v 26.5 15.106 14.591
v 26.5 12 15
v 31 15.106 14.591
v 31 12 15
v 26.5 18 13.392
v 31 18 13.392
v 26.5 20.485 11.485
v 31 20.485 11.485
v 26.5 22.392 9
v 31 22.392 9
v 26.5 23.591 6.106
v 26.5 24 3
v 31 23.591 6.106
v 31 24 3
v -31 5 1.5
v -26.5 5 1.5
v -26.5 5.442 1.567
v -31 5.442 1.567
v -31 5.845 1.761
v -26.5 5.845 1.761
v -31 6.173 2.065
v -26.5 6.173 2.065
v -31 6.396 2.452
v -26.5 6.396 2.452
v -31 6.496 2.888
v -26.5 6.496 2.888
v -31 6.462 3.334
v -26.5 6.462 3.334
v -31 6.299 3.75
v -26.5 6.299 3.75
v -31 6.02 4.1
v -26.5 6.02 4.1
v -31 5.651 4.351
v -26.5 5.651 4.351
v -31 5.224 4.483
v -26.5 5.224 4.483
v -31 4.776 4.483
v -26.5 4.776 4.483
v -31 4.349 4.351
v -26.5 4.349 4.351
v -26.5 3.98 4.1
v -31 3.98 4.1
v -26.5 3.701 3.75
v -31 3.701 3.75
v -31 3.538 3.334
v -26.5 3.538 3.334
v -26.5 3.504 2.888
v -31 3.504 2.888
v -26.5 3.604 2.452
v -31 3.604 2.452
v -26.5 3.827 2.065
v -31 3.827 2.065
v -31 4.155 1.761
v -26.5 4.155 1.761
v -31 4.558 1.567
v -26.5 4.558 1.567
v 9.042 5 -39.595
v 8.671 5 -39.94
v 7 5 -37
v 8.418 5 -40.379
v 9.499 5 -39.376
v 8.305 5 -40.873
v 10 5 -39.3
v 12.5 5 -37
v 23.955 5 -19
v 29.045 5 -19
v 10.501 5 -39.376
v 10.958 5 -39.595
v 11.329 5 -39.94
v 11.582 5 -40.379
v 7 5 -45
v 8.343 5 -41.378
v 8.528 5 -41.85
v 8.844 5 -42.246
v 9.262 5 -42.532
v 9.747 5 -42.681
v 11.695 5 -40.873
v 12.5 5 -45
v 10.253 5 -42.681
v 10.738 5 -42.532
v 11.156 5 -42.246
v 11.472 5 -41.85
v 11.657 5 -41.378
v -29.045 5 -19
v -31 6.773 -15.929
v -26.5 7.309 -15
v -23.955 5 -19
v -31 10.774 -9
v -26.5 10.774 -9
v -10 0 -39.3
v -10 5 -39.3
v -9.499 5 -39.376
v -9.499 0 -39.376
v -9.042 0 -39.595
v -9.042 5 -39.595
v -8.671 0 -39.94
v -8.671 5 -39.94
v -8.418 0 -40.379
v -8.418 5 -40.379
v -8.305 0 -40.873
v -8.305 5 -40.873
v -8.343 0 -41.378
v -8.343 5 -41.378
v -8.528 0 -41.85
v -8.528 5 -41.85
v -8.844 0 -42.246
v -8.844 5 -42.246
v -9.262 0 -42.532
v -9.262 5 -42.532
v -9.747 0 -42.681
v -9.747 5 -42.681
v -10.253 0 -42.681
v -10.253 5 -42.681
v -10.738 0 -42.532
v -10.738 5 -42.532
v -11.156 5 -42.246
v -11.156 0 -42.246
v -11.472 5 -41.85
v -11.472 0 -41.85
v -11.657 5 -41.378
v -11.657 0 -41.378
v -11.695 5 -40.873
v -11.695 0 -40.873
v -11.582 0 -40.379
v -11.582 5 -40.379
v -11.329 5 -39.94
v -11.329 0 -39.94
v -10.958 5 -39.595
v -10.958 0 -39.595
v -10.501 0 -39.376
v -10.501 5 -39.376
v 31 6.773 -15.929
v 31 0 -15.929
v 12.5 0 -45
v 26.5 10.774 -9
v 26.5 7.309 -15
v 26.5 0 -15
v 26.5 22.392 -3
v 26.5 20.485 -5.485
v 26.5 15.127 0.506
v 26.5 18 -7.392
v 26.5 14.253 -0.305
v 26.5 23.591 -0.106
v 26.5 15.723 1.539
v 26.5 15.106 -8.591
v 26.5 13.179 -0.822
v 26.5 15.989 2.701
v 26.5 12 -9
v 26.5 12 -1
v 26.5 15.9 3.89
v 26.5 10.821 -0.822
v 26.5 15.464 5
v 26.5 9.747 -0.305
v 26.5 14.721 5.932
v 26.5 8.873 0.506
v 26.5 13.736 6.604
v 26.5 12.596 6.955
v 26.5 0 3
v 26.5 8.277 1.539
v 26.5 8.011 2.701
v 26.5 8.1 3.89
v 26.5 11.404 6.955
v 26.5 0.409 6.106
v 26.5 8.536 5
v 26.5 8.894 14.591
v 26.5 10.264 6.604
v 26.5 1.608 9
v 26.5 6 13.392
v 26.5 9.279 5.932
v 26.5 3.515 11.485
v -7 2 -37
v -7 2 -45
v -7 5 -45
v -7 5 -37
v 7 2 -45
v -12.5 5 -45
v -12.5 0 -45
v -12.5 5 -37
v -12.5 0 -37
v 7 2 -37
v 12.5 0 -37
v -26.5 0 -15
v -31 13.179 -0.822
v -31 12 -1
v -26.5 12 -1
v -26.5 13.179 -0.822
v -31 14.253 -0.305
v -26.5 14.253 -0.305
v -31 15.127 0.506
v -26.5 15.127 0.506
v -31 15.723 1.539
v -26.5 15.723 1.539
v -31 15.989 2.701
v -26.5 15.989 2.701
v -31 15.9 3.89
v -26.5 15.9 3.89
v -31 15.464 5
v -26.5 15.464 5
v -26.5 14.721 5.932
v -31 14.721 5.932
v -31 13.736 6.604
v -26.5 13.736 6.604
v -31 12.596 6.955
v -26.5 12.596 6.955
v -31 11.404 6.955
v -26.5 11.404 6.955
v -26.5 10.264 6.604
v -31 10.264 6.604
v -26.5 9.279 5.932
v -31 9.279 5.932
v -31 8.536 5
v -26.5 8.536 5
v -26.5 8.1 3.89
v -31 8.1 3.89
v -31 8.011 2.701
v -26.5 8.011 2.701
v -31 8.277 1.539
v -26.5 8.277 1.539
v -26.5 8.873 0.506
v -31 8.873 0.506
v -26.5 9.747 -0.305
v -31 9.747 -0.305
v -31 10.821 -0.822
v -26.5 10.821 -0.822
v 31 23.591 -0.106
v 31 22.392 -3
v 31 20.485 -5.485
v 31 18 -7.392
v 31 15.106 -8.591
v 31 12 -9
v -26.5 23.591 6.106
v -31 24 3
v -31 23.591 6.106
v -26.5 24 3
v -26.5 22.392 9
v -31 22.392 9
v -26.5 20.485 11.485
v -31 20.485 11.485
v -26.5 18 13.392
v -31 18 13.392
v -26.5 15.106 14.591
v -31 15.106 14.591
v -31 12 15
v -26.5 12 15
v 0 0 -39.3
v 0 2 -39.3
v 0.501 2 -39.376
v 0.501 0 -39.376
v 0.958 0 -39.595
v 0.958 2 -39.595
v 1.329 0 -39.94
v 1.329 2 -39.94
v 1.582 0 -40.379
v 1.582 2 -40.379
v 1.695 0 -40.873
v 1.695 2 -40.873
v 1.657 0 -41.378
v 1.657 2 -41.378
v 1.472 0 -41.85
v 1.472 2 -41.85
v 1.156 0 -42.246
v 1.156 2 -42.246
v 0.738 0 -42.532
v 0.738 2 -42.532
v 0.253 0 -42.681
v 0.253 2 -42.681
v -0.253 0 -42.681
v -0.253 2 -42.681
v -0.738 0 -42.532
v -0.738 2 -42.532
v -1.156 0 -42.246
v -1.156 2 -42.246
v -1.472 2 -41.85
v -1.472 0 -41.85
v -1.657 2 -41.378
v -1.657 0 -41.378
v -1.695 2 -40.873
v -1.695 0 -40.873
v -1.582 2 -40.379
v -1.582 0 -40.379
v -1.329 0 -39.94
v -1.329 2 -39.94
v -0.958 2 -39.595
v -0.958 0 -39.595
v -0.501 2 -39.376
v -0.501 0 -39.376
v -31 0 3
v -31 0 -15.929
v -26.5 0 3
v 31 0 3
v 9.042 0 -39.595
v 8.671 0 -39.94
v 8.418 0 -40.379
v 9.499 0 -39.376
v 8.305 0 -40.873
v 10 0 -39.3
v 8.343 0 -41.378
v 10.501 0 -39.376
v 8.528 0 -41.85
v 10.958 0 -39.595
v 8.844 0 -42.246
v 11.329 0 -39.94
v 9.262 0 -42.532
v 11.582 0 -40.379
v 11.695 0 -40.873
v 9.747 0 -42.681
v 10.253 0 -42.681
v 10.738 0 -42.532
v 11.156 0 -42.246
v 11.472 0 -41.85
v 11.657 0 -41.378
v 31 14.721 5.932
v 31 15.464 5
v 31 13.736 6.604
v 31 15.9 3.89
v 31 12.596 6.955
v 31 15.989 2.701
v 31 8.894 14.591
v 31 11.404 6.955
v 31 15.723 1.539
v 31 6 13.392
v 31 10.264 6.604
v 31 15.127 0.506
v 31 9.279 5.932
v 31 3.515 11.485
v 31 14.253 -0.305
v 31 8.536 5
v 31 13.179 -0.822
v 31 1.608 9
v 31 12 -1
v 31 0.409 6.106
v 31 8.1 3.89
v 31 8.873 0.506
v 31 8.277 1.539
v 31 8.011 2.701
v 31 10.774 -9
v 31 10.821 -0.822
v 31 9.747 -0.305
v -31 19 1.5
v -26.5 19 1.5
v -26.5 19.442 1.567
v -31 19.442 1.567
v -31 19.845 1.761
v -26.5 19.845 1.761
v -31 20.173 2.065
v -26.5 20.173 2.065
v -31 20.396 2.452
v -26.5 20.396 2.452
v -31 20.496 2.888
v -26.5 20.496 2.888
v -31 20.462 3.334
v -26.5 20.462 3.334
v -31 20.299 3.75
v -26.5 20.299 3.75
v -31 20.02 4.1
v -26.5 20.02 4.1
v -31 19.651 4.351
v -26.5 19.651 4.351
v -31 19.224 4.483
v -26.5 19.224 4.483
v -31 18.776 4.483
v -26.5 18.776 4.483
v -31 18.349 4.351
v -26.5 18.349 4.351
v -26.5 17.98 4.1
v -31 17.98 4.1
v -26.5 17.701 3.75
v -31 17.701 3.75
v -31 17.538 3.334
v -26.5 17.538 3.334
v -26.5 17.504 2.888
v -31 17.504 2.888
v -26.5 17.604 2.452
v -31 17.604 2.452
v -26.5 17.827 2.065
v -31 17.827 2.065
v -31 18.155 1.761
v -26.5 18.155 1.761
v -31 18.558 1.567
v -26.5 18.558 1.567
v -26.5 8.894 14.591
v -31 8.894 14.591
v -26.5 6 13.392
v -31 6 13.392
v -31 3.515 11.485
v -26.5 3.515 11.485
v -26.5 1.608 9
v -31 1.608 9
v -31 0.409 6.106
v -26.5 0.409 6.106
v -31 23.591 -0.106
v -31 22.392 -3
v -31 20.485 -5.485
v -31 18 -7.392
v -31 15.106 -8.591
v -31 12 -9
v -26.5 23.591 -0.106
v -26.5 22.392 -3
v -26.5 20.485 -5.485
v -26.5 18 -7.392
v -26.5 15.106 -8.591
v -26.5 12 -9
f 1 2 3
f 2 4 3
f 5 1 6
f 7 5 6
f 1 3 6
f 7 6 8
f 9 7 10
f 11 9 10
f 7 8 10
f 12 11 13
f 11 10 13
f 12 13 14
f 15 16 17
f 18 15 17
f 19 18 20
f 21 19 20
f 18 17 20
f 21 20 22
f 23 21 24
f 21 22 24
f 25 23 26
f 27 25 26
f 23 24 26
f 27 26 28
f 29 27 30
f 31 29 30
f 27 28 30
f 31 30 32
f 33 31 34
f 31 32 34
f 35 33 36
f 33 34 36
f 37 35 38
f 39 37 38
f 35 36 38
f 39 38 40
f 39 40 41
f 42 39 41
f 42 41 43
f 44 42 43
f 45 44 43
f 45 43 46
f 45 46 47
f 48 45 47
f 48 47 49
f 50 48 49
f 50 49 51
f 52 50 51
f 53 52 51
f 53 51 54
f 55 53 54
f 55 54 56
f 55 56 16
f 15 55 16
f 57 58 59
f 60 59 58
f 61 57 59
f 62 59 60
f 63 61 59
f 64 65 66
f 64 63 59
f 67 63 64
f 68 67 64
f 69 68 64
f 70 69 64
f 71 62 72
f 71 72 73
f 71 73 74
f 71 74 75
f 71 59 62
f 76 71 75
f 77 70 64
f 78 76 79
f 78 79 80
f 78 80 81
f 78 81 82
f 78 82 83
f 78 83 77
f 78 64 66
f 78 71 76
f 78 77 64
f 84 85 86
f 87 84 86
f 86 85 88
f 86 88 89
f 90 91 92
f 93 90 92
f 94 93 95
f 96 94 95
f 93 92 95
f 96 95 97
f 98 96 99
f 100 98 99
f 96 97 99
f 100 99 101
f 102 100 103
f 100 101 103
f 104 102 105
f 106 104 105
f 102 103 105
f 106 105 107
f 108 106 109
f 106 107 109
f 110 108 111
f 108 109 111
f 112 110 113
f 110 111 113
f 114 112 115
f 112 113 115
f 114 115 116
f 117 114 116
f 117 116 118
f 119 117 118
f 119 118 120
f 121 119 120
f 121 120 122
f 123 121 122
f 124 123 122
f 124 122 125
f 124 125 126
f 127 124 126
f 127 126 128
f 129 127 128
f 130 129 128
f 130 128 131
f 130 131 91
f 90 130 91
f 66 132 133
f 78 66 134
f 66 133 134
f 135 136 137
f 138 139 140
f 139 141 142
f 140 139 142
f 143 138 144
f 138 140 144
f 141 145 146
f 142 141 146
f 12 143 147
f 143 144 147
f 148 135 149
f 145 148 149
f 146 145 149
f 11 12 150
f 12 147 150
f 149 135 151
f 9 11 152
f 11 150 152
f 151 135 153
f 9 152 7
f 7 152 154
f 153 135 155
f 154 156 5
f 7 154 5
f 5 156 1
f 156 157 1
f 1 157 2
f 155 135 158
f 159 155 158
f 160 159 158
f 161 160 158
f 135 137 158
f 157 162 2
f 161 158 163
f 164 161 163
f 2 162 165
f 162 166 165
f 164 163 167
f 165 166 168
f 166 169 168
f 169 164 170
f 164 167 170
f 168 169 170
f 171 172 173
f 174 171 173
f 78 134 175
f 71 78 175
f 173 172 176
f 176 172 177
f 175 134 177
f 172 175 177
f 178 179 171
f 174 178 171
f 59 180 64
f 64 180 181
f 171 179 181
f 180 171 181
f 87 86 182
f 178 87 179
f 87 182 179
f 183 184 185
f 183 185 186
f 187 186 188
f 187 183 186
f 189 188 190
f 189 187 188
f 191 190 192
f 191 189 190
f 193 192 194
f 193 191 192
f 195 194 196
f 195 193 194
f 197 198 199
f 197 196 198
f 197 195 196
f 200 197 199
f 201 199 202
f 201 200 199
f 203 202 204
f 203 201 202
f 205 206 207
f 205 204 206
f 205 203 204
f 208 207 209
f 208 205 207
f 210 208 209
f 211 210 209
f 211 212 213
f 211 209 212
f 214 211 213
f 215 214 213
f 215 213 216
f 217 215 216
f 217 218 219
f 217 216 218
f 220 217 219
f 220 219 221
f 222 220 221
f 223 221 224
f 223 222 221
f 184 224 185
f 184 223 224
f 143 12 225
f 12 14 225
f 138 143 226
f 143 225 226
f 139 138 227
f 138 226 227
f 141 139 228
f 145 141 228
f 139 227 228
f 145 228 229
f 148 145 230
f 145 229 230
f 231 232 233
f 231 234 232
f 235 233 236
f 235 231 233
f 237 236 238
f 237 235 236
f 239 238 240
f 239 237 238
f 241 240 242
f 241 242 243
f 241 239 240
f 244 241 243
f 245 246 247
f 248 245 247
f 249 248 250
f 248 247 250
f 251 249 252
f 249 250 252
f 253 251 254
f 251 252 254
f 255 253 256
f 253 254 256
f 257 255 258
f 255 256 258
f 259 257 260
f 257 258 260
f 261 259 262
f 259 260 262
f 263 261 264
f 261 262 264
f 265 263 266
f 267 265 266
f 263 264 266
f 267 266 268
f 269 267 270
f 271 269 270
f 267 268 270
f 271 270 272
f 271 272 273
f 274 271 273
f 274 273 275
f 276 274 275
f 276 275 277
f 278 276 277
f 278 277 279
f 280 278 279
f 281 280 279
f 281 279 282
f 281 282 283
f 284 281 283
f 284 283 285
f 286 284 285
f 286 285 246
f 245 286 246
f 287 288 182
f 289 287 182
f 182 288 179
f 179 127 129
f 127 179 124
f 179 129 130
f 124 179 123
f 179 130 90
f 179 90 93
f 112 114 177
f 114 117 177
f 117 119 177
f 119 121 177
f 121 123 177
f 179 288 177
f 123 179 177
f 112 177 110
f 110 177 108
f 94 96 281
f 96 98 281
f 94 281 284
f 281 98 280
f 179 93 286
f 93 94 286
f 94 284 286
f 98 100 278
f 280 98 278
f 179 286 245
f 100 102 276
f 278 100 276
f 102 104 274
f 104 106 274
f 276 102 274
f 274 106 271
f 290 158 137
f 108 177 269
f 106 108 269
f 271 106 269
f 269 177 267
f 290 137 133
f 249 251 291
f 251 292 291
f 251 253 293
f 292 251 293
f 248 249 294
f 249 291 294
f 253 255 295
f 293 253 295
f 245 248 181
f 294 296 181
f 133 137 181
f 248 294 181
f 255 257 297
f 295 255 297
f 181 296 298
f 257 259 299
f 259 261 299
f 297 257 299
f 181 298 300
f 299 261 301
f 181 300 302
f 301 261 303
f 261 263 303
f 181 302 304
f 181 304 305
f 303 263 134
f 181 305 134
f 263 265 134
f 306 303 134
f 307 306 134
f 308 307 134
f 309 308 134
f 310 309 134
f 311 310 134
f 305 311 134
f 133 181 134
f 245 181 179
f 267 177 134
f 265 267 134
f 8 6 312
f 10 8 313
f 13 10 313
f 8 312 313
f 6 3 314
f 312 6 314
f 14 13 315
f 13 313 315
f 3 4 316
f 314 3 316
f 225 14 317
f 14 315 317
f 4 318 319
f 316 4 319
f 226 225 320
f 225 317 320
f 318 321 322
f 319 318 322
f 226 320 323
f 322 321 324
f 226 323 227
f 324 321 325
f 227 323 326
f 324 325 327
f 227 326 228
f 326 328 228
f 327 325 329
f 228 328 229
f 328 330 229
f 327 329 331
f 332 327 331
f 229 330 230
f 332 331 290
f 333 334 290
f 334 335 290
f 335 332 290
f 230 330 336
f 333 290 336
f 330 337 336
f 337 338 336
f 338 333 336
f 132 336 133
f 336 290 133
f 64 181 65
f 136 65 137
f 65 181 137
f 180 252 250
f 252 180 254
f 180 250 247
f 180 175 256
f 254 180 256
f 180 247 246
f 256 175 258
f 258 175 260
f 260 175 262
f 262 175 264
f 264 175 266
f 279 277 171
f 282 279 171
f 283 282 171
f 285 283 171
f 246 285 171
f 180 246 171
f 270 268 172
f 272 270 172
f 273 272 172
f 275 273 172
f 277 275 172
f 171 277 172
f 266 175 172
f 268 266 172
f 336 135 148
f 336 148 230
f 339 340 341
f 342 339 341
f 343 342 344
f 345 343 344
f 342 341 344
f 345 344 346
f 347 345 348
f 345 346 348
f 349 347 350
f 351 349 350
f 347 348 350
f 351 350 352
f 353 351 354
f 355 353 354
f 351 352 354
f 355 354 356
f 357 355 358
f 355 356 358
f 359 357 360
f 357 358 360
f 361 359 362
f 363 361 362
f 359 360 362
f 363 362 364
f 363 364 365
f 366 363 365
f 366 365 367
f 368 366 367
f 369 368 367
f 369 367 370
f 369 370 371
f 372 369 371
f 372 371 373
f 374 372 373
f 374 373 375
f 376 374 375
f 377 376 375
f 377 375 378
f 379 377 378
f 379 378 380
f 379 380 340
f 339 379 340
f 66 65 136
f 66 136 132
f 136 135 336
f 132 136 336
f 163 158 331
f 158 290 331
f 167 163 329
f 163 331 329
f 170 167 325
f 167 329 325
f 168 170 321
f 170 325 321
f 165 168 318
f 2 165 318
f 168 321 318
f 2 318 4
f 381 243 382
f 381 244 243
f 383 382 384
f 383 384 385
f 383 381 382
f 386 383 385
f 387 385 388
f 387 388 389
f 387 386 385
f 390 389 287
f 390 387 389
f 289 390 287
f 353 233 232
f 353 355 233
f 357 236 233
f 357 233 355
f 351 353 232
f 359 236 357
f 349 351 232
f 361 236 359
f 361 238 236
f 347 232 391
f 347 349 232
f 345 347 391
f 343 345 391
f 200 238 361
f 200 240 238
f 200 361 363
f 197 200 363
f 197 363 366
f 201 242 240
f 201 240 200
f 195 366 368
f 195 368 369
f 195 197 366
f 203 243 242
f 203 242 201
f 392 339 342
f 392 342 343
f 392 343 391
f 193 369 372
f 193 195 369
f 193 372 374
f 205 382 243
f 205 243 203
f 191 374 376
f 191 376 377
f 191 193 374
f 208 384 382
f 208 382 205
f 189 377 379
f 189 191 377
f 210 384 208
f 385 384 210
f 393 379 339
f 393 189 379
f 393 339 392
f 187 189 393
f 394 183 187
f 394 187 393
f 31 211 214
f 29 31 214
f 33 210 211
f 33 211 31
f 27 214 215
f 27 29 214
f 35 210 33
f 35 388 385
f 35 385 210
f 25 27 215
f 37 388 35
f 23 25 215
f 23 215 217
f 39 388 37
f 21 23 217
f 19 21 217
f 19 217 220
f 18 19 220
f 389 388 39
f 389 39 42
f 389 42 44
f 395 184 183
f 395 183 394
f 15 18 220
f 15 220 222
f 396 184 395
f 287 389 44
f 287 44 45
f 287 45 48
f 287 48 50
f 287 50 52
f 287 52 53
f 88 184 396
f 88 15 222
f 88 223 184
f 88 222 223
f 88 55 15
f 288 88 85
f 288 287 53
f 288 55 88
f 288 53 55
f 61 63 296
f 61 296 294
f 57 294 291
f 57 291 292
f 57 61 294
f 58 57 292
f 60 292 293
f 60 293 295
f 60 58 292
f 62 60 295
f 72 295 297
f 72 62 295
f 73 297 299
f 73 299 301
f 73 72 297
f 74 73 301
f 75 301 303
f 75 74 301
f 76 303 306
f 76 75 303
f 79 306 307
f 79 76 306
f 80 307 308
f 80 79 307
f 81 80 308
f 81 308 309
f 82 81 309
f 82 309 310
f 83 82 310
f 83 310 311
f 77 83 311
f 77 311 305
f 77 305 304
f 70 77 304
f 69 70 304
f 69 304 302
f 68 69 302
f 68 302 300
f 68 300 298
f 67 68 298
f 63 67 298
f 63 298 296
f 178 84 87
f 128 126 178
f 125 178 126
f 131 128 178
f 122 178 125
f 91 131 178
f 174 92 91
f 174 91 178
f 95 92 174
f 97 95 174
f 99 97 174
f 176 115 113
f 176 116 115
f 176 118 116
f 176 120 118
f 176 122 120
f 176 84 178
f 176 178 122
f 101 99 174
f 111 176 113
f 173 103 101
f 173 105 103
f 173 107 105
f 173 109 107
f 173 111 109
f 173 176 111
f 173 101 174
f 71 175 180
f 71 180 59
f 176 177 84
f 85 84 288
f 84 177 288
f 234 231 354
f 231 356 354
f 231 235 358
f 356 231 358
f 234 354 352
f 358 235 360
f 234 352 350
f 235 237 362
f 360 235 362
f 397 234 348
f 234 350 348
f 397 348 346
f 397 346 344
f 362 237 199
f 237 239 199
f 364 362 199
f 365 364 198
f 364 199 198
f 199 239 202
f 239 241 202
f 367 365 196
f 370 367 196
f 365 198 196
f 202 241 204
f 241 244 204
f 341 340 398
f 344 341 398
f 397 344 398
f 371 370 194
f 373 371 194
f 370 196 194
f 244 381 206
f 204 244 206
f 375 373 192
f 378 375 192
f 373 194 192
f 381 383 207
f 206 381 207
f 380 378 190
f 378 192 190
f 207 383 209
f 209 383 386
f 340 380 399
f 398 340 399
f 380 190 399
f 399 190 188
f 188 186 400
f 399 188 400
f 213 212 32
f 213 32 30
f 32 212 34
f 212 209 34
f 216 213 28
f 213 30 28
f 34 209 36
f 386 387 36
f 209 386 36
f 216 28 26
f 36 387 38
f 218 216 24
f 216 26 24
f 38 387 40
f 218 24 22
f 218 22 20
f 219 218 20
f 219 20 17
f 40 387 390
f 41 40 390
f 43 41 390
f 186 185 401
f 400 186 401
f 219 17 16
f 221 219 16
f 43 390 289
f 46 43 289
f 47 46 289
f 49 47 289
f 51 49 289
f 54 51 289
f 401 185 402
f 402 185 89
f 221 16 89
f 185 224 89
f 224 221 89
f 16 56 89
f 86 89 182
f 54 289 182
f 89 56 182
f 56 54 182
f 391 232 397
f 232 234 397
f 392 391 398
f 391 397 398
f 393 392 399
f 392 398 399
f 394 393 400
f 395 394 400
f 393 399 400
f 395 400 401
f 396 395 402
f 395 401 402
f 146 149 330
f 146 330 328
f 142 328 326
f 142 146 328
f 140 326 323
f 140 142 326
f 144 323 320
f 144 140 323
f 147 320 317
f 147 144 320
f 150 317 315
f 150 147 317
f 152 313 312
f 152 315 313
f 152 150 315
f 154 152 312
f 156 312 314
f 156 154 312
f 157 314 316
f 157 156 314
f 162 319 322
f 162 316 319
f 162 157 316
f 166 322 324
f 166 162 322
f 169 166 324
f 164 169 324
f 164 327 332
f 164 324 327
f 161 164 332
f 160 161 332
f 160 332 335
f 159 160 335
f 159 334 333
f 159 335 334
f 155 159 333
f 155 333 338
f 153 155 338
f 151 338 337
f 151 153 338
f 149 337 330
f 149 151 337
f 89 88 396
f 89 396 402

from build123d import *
from OCP.BRepFilletAPI import BRepFilletAPI_MakeChamfer

# Parameters (mm, degrees)
BOSS_EXTRUDE1_DEPTH     = 5
SKETCH2_W               = 4.5
SKETCH2_H               = 24
BOSS_EXTRUDE2_DEPTH     = 19
CUT_EXTRUDE1_REACH      = 59.853
SKETCH5_R               = 1.7
CUT_EXTRUDE2_REACH      = 73.673
SKETCH6_W               = 14
SKETCH6_H               = 3
CUT_EXTRUDE3_REACH      = 78.859
SKETCH7_R               = 1.5
CUT_EXTRUDE4_DEPTH      = 77.85863647
CUT_EXTRUDE4_DEPTH_BACK = 77.85863647
SKETCH8_R               = 4
FILLET1_R               = 12
CHAMFER2_SIZE           = 10
CHAMFER2_SIZE2          = 5.773502692
CUT_EXTRUDE5_REACH      = 59.853
SKETCH10_R              = 1.7


with BuildPart() as part:
    # Sketch1 → Boss-Extrude1 (new body)
    with BuildSketch(Plane(origin=(0, 0, 0), x_dir=(1, 0, 0), z_dir=(0, 1, 0))):
        Polygon((-31, 15.928571429), (-31, -15), (-26.5, -15), (-26.5, 15), (-12.5, 37), (12.5, 37), (26.5, 15), (26.5, -15), (31, -15), (31, 15.928571429), (12.5, 45), (-12.5, 45), align=None)
    extrude(amount=BOSS_EXTRUDE1_DEPTH)

    # Sketch2 → Boss-Extrude2 (add)
    with BuildSketch(Plane(origin=(0, 5, 0), x_dir=(1, 0, 0), z_dir=(0, 1, 0))):
        with Locations((-28.75, -3)):
            Rectangle(SKETCH2_W, SKETCH2_H)
        with Locations((28.75, -3)):
            Rectangle(SKETCH2_W, SKETCH2_H)
    extrude(amount=BOSS_EXTRUDE2_DEPTH)

    # Sketch5 → Cut-Extrude1 (cut, up to next)
    with BuildSketch(Plane(origin=(0, 5, 0), x_dir=(1, 0, 0), z_dir=(0, 1, 0)), mode=Mode.PRIVATE) as cut_extrude1_sk1:
        with Locations(Location((0, 41, 0), (0, 0, 270))):
            Circle(SKETCH5_R)
    cut_extrude1_tool1 = extrude(cut_extrude1_sk1.sketch, amount=-CUT_EXTRUDE1_REACH, mode=Mode.PRIVATE) & part.part
    add(cut_extrude1_tool1.solids().sort_by_distance((0, 5, -41))[0], mode=Mode.SUBTRACT)

    # Cut-Extrude2: up to this face of the body (flat: up to its plane)
    cut_extrude2_end = Plane(part.part.faces().sort_by_distance((0, 2.5, -37))[0])
    # Sketch6 → Cut-Extrude2 (cut, up to the picked face)
    with BuildSketch(Plane(origin=(0, 0, -45), x_dir=(-1, 0, 0), z_dir=(0, 0, -1)), mode=Mode.PRIVATE) as cut_extrude2_sk1:
        with Locations((0, 3.5)):
            Rectangle(SKETCH6_W, SKETCH6_H)
    cut_extrude2_tool1 = split(extrude(cut_extrude2_sk1.sketch, amount=-CUT_EXTRUDE2_REACH, mode=Mode.PRIVATE), bisect_by=cut_extrude2_end, keep=Keep.BOTH, mode=Mode.PRIVATE)
    add(cut_extrude2_tool1.solids().sort_by(Axis((0, 3.5, -45), (0, 0, 1)))[0], mode=Mode.SUBTRACT)

    # Sketch7 → Cut-Extrude3 (cut, up to next)
    with BuildSketch(Plane(origin=(-26.5, 0, 0), x_dir=(0, 0, -1), z_dir=(1, 0, 0)), mode=Mode.PRIVATE) as cut_extrude3_sk1:
        with Locations((-3, 19)):
            Circle(SKETCH7_R)
    cut_extrude3_tool1 = extrude(cut_extrude3_sk1.sketch, amount=-CUT_EXTRUDE3_REACH, mode=Mode.PRIVATE) & part.part
    # Sketch7 → Cut-Extrude3 (cut, up to next)
    with BuildSketch(Plane(origin=(-26.5, 0, 0), x_dir=(0, 0, -1), z_dir=(1, 0, 0)), mode=Mode.PRIVATE) as cut_extrude3_sk2:
        with Locations((-3, 5)):
            Circle(SKETCH7_R)
    cut_extrude3_tool2 = extrude(cut_extrude3_sk2.sketch, amount=-CUT_EXTRUDE3_REACH, mode=Mode.PRIVATE) & part.part
    add(cut_extrude3_tool1.solids().sort_by_distance((-26.5, 19, 3))[0], mode=Mode.SUBTRACT)
    add(cut_extrude3_tool2.solids().sort_by_distance((-26.5, 5, 3))[0], mode=Mode.SUBTRACT)

    # Sketch8 → Cut-Extrude4 (cut, two sides: drawn at the far end of the back side and taken through both)
    with BuildSketch(Plane(origin=(-26.5, 0, 0), x_dir=(0, 0, -1), z_dir=(1, 0, 0)).offset(-CUT_EXTRUDE4_DEPTH_BACK)):
        with Locations((-3, 12)):
            Circle(SKETCH8_R)
    extrude(amount=CUT_EXTRUDE4_DEPTH + CUT_EXTRUDE4_DEPTH_BACK, mode=Mode.SUBTRACT)

    # Fillet1
    fillet1_edges = [part.edges().sort_by_distance(p)[0] for p in [
        (28.75, 0, 15),
        (-28.75, 0, 15),
        (-28.75, 24, -9),
        (28.75, 24, -9),
        (28.75, 24, 15),
        (-28.75, 24, 15),
    ]]
    fillet(fillet1_edges, radius=FILLET1_R - 0.0001)  # a hair under: the kernel refuses the full size

    # Chamfer2: one chamfer whose edges measure the first distance from different faces: ONE call of the kernel's chamfer builder (chamfer() names one face for all edges)
    chamfer2_edges_1 = [part.edges().sort_by_distance(p)[0] for p in [
        (-28.75, 5, -9),
    ]]
    chamfer2_side_1 = [part.faces().sort_by_distance(p)[0] for p in [
        (-19.473621736, 5, -28.773341624),
    ]]
    chamfer2_edges_2 = [part.edges().sort_by_distance(p)[0] for p in [
        (28.75, 5, -9),
    ]]
    chamfer2_side_2 = [part.faces().sort_by_distance(p)[0] for p in [
        (19.473621736, 5, -28.773341624),
    ]]
    chamfer2 = BRepFilletAPI_MakeChamfer(part.part.solid().wrapped)
    for e in chamfer2_edges_1:
        chamfer2.Add(CHAMFER2_SIZE, CHAMFER2_SIZE2, e.wrapped, chamfer2_side_1[0].wrapped)  # the first distance lies on this face
    for e in chamfer2_edges_2:
        chamfer2.Add(CHAMFER2_SIZE, CHAMFER2_SIZE2, e.wrapped, chamfer2_side_2[0].wrapped)  # the first distance lies on this face
    add(Compound.cast(chamfer2.Shape()), mode=Mode.REPLACE)

    # Sketch10 → Cut-Extrude5 (cut, up to next)
    with BuildSketch(Plane(origin=(0, 5, 0), x_dir=(1, 0, 0), z_dir=(0, 1, 0)), mode=Mode.PRIVATE) as cut_extrude5_sk1:
        with Locations(Location((-10, 41, 0), (0, 0, 270))):
            Circle(SKETCH10_R)
    cut_extrude5_tool1 = extrude(cut_extrude5_sk1.sketch, amount=-CUT_EXTRUDE5_REACH, mode=Mode.PRIVATE) & part.part
    cut_extrude5 = cut_extrude5_tool1.solids().sort_by_distance((-10, 5, -41))[0]
    add(cut_extrude5, mode=Mode.SUBTRACT)

    # Mirror1: Cut-Extrude5 across plane
    add(cut_extrude5.mirror(Plane(origin=(0, 0, 0), x_dir=(0, 0, 1), z_dir=(1, 0, 0))), mode=Mode.SUBTRACT)


solid = part.part
